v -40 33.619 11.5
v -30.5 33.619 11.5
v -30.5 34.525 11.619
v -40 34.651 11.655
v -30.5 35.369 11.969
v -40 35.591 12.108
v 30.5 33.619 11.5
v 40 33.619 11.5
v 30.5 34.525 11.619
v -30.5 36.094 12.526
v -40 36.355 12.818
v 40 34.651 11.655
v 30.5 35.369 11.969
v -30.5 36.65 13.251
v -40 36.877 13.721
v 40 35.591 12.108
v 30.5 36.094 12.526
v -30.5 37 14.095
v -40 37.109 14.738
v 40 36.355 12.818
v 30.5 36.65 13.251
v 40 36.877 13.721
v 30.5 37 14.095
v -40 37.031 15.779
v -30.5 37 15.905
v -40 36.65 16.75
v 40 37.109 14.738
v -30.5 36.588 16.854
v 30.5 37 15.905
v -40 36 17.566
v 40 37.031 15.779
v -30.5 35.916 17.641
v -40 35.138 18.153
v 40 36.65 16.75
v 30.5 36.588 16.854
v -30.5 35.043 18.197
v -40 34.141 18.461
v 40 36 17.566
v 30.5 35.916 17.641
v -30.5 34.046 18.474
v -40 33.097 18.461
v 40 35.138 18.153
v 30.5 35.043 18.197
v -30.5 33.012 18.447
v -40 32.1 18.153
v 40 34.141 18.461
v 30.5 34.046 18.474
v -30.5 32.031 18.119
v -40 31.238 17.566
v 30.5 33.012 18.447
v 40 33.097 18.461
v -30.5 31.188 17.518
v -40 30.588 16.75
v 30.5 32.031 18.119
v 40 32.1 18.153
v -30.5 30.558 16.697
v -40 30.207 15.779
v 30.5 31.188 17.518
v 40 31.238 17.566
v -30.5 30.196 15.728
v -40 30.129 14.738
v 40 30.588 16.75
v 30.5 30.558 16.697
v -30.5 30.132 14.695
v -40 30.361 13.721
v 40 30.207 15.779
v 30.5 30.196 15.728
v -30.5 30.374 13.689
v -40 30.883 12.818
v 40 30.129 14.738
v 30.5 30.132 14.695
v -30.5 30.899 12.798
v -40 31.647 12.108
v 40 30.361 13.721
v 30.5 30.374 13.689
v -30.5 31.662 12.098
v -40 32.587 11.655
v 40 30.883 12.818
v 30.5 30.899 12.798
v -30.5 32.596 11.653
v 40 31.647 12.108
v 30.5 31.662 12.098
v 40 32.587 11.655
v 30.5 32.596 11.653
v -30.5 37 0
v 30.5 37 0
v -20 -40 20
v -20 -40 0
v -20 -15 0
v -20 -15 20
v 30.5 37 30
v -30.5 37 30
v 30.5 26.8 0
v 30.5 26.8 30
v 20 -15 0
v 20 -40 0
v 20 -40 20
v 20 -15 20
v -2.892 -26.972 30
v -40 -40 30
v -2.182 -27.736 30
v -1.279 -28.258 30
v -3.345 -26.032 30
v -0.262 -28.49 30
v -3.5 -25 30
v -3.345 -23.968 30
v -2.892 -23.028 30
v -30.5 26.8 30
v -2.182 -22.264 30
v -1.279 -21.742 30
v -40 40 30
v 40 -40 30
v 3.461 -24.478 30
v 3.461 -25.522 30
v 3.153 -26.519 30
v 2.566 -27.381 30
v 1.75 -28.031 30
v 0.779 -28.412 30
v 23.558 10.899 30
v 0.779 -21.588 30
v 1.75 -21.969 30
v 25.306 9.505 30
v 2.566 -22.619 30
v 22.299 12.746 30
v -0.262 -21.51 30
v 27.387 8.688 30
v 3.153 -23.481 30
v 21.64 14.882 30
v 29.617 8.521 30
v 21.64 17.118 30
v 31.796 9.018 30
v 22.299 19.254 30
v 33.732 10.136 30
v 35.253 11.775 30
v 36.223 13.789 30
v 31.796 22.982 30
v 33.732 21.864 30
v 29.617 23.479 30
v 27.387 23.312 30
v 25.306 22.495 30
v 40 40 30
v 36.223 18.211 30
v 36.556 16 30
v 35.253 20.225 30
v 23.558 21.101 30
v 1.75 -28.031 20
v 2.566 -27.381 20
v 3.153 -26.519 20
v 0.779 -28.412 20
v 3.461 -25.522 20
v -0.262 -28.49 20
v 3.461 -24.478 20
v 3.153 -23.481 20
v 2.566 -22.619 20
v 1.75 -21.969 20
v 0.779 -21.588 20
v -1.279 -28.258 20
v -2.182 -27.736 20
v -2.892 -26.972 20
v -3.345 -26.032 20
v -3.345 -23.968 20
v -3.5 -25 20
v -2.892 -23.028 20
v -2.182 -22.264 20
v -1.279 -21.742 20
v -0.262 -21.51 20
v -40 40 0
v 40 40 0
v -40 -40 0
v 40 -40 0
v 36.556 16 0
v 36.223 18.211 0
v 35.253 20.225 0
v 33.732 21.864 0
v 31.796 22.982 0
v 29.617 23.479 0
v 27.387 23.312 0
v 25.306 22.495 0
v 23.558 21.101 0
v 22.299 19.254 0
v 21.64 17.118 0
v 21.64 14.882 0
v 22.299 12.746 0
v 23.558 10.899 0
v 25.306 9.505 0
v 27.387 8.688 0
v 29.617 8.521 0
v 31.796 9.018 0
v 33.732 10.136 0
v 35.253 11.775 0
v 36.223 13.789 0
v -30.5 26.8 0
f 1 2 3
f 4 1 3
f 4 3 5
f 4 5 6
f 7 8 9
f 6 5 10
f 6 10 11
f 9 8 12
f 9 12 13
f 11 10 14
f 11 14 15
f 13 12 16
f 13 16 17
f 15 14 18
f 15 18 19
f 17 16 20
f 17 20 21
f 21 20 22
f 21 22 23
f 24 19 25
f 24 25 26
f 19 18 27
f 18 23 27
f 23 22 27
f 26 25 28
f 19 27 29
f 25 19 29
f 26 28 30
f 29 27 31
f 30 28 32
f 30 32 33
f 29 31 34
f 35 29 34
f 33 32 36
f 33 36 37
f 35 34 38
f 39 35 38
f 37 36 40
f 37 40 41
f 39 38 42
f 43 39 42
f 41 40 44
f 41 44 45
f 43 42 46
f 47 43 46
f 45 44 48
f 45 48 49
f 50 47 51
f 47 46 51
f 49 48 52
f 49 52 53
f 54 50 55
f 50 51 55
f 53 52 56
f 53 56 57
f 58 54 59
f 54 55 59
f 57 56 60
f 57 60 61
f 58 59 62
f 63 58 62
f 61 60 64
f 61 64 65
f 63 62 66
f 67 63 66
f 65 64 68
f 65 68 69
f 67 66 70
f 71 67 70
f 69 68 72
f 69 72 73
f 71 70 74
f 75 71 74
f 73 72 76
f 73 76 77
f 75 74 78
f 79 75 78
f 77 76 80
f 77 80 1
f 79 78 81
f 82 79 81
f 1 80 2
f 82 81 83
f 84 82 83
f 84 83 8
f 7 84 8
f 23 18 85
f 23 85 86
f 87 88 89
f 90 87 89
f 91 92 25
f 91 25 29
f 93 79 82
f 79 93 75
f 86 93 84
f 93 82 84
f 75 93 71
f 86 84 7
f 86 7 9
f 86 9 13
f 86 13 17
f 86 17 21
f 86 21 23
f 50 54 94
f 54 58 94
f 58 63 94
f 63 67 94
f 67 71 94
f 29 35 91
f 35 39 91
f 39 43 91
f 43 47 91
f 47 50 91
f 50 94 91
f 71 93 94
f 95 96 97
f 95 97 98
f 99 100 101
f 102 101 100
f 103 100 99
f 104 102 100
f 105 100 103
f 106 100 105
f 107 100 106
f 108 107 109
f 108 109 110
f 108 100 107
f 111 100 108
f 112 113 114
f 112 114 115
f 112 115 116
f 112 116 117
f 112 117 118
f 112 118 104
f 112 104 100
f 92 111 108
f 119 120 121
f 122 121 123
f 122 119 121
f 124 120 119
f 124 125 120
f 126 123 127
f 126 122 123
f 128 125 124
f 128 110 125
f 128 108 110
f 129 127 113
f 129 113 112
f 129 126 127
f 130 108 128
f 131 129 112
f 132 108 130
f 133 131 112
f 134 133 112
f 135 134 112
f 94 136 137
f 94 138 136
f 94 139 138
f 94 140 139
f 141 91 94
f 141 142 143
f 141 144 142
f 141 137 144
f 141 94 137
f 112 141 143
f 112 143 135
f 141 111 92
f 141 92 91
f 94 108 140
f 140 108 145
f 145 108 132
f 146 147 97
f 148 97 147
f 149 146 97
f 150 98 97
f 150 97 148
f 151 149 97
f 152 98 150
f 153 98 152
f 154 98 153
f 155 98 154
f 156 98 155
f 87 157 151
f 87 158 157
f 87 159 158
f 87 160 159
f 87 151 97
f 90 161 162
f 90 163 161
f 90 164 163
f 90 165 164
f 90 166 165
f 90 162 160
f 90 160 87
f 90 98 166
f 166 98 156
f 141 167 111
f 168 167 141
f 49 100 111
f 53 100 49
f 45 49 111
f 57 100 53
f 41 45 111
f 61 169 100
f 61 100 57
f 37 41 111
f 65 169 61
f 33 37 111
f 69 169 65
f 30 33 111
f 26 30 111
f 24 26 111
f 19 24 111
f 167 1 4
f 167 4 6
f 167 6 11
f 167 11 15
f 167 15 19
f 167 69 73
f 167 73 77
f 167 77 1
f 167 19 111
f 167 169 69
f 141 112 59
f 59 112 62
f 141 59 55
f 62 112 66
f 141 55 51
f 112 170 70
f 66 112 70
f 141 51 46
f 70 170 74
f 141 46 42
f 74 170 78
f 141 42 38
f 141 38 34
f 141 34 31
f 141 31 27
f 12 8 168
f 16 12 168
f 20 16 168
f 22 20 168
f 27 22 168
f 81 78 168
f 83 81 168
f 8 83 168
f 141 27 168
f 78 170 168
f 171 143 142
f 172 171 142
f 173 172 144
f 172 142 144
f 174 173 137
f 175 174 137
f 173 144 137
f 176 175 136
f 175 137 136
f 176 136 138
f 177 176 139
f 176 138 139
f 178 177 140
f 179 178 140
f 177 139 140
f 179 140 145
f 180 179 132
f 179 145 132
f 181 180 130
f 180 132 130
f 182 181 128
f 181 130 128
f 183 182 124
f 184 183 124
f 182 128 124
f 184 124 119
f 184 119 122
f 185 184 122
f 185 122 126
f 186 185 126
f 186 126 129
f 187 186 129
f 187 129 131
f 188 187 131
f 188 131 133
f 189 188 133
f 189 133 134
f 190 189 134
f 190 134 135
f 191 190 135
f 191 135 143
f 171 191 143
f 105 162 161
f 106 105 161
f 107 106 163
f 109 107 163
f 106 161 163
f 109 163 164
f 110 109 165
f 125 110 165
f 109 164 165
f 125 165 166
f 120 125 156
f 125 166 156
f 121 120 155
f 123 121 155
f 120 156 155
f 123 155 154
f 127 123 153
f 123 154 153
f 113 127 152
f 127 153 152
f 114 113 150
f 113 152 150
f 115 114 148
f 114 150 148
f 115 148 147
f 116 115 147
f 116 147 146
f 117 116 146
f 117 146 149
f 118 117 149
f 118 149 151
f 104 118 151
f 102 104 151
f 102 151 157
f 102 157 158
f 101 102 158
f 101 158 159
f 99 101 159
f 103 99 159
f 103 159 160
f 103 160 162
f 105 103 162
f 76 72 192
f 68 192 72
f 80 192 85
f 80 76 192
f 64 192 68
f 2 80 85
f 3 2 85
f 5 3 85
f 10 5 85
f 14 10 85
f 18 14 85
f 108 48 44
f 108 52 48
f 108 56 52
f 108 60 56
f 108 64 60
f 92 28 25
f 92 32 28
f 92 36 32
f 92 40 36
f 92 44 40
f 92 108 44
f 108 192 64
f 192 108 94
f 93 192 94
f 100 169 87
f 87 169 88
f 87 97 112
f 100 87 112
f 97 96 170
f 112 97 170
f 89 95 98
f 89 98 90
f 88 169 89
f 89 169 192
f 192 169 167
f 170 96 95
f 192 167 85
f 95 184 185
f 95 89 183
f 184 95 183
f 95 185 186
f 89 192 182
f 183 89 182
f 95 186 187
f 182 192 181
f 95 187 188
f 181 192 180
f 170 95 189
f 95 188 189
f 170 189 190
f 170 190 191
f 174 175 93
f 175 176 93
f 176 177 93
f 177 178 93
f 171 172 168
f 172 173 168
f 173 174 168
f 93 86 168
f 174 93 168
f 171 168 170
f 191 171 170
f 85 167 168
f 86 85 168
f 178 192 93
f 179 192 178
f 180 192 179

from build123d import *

# Parameters (mm, degrees)
SKETCH1_W           = 80
SKETCH1_H           = 80
BOSS_EXTRUDE1_DEPTH = 30
SKETCH2_W           = 61
SKETCH2_H           = 10.2
CUT_EXTRUDE1_DEPTH  = 65.031242374
SKETCH3_W           = 40
SKETCH3_H           = 25
CUT_EXTRUDE2_DEPTH  = 20
SKETCH4_R           = 3.5
CUT_EXTRUDE3_DEPTH  = 61
SKETCH5_R           = 3.5
CUT_EXTRUDE4_DEPTH  = 95.339811321
SKETCH6_R           = 7.5
CUT_EXTRUDE5_DEPTH  = 65.031242374


with BuildPart() as part:
    # Sketch1 → Boss-Extrude1 (new body)
    with BuildSketch(Plane.XY):
        Rectangle(SKETCH1_W, SKETCH1_H)
    extrude(amount=BOSS_EXTRUDE1_DEPTH)

    # Sketch2 → Cut-Extrude1 (cut, through all)
    with BuildSketch(Plane.XY.offset(30)):
        with Locations((0, 31.9)):
            Rectangle(SKETCH2_W, SKETCH2_H)
    extrude(amount=-CUT_EXTRUDE1_DEPTH, mode=Mode.SUBTRACT)

    # Sketch3 → Cut-Extrude2 (cut)
    with BuildSketch(Plane(origin=(0, 0, 0), x_dir=(-1, 0, 0), z_dir=(0, 0, -1))):
        with Locations((0, -27.5)):
            Rectangle(SKETCH3_W, SKETCH3_H)
    extrude(amount=-CUT_EXTRUDE2_DEPTH, mode=Mode.SUBTRACT)

    # Sketch4 → Cut-Extrude3 (cut, through all)
    with BuildSketch(Plane(origin=(0, 0, 20), x_dir=(-1, 0, 0), z_dir=(0, 0, -1))):
        with Locations((0, -25)):
            Circle(SKETCH4_R)
    extrude(amount=-CUT_EXTRUDE3_DEPTH, mode=Mode.SUBTRACT)

    # Sketch5 → Cut-Extrude4 (cut, through all)
    with BuildSketch(Plane(origin=(40, 0, 0), x_dir=(0, 0, -1), z_dir=(1, 0, 0))):
        with Locations((-15, 33.619017373)):
            Circle(SKETCH5_R)
    extrude(amount=-CUT_EXTRUDE4_DEPTH, mode=Mode.SUBTRACT)

    # Sketch6 → Cut-Extrude5 (cut, through all)
    with BuildSketch(Plane.XY.offset(30)):
        with Locations((29.056312598, 16)):
            Circle(SKETCH6_R)
    extrude(amount=-CUT_EXTRUDE5_DEPTH, mode=Mode.SUBTRACT)


solid = part.part
